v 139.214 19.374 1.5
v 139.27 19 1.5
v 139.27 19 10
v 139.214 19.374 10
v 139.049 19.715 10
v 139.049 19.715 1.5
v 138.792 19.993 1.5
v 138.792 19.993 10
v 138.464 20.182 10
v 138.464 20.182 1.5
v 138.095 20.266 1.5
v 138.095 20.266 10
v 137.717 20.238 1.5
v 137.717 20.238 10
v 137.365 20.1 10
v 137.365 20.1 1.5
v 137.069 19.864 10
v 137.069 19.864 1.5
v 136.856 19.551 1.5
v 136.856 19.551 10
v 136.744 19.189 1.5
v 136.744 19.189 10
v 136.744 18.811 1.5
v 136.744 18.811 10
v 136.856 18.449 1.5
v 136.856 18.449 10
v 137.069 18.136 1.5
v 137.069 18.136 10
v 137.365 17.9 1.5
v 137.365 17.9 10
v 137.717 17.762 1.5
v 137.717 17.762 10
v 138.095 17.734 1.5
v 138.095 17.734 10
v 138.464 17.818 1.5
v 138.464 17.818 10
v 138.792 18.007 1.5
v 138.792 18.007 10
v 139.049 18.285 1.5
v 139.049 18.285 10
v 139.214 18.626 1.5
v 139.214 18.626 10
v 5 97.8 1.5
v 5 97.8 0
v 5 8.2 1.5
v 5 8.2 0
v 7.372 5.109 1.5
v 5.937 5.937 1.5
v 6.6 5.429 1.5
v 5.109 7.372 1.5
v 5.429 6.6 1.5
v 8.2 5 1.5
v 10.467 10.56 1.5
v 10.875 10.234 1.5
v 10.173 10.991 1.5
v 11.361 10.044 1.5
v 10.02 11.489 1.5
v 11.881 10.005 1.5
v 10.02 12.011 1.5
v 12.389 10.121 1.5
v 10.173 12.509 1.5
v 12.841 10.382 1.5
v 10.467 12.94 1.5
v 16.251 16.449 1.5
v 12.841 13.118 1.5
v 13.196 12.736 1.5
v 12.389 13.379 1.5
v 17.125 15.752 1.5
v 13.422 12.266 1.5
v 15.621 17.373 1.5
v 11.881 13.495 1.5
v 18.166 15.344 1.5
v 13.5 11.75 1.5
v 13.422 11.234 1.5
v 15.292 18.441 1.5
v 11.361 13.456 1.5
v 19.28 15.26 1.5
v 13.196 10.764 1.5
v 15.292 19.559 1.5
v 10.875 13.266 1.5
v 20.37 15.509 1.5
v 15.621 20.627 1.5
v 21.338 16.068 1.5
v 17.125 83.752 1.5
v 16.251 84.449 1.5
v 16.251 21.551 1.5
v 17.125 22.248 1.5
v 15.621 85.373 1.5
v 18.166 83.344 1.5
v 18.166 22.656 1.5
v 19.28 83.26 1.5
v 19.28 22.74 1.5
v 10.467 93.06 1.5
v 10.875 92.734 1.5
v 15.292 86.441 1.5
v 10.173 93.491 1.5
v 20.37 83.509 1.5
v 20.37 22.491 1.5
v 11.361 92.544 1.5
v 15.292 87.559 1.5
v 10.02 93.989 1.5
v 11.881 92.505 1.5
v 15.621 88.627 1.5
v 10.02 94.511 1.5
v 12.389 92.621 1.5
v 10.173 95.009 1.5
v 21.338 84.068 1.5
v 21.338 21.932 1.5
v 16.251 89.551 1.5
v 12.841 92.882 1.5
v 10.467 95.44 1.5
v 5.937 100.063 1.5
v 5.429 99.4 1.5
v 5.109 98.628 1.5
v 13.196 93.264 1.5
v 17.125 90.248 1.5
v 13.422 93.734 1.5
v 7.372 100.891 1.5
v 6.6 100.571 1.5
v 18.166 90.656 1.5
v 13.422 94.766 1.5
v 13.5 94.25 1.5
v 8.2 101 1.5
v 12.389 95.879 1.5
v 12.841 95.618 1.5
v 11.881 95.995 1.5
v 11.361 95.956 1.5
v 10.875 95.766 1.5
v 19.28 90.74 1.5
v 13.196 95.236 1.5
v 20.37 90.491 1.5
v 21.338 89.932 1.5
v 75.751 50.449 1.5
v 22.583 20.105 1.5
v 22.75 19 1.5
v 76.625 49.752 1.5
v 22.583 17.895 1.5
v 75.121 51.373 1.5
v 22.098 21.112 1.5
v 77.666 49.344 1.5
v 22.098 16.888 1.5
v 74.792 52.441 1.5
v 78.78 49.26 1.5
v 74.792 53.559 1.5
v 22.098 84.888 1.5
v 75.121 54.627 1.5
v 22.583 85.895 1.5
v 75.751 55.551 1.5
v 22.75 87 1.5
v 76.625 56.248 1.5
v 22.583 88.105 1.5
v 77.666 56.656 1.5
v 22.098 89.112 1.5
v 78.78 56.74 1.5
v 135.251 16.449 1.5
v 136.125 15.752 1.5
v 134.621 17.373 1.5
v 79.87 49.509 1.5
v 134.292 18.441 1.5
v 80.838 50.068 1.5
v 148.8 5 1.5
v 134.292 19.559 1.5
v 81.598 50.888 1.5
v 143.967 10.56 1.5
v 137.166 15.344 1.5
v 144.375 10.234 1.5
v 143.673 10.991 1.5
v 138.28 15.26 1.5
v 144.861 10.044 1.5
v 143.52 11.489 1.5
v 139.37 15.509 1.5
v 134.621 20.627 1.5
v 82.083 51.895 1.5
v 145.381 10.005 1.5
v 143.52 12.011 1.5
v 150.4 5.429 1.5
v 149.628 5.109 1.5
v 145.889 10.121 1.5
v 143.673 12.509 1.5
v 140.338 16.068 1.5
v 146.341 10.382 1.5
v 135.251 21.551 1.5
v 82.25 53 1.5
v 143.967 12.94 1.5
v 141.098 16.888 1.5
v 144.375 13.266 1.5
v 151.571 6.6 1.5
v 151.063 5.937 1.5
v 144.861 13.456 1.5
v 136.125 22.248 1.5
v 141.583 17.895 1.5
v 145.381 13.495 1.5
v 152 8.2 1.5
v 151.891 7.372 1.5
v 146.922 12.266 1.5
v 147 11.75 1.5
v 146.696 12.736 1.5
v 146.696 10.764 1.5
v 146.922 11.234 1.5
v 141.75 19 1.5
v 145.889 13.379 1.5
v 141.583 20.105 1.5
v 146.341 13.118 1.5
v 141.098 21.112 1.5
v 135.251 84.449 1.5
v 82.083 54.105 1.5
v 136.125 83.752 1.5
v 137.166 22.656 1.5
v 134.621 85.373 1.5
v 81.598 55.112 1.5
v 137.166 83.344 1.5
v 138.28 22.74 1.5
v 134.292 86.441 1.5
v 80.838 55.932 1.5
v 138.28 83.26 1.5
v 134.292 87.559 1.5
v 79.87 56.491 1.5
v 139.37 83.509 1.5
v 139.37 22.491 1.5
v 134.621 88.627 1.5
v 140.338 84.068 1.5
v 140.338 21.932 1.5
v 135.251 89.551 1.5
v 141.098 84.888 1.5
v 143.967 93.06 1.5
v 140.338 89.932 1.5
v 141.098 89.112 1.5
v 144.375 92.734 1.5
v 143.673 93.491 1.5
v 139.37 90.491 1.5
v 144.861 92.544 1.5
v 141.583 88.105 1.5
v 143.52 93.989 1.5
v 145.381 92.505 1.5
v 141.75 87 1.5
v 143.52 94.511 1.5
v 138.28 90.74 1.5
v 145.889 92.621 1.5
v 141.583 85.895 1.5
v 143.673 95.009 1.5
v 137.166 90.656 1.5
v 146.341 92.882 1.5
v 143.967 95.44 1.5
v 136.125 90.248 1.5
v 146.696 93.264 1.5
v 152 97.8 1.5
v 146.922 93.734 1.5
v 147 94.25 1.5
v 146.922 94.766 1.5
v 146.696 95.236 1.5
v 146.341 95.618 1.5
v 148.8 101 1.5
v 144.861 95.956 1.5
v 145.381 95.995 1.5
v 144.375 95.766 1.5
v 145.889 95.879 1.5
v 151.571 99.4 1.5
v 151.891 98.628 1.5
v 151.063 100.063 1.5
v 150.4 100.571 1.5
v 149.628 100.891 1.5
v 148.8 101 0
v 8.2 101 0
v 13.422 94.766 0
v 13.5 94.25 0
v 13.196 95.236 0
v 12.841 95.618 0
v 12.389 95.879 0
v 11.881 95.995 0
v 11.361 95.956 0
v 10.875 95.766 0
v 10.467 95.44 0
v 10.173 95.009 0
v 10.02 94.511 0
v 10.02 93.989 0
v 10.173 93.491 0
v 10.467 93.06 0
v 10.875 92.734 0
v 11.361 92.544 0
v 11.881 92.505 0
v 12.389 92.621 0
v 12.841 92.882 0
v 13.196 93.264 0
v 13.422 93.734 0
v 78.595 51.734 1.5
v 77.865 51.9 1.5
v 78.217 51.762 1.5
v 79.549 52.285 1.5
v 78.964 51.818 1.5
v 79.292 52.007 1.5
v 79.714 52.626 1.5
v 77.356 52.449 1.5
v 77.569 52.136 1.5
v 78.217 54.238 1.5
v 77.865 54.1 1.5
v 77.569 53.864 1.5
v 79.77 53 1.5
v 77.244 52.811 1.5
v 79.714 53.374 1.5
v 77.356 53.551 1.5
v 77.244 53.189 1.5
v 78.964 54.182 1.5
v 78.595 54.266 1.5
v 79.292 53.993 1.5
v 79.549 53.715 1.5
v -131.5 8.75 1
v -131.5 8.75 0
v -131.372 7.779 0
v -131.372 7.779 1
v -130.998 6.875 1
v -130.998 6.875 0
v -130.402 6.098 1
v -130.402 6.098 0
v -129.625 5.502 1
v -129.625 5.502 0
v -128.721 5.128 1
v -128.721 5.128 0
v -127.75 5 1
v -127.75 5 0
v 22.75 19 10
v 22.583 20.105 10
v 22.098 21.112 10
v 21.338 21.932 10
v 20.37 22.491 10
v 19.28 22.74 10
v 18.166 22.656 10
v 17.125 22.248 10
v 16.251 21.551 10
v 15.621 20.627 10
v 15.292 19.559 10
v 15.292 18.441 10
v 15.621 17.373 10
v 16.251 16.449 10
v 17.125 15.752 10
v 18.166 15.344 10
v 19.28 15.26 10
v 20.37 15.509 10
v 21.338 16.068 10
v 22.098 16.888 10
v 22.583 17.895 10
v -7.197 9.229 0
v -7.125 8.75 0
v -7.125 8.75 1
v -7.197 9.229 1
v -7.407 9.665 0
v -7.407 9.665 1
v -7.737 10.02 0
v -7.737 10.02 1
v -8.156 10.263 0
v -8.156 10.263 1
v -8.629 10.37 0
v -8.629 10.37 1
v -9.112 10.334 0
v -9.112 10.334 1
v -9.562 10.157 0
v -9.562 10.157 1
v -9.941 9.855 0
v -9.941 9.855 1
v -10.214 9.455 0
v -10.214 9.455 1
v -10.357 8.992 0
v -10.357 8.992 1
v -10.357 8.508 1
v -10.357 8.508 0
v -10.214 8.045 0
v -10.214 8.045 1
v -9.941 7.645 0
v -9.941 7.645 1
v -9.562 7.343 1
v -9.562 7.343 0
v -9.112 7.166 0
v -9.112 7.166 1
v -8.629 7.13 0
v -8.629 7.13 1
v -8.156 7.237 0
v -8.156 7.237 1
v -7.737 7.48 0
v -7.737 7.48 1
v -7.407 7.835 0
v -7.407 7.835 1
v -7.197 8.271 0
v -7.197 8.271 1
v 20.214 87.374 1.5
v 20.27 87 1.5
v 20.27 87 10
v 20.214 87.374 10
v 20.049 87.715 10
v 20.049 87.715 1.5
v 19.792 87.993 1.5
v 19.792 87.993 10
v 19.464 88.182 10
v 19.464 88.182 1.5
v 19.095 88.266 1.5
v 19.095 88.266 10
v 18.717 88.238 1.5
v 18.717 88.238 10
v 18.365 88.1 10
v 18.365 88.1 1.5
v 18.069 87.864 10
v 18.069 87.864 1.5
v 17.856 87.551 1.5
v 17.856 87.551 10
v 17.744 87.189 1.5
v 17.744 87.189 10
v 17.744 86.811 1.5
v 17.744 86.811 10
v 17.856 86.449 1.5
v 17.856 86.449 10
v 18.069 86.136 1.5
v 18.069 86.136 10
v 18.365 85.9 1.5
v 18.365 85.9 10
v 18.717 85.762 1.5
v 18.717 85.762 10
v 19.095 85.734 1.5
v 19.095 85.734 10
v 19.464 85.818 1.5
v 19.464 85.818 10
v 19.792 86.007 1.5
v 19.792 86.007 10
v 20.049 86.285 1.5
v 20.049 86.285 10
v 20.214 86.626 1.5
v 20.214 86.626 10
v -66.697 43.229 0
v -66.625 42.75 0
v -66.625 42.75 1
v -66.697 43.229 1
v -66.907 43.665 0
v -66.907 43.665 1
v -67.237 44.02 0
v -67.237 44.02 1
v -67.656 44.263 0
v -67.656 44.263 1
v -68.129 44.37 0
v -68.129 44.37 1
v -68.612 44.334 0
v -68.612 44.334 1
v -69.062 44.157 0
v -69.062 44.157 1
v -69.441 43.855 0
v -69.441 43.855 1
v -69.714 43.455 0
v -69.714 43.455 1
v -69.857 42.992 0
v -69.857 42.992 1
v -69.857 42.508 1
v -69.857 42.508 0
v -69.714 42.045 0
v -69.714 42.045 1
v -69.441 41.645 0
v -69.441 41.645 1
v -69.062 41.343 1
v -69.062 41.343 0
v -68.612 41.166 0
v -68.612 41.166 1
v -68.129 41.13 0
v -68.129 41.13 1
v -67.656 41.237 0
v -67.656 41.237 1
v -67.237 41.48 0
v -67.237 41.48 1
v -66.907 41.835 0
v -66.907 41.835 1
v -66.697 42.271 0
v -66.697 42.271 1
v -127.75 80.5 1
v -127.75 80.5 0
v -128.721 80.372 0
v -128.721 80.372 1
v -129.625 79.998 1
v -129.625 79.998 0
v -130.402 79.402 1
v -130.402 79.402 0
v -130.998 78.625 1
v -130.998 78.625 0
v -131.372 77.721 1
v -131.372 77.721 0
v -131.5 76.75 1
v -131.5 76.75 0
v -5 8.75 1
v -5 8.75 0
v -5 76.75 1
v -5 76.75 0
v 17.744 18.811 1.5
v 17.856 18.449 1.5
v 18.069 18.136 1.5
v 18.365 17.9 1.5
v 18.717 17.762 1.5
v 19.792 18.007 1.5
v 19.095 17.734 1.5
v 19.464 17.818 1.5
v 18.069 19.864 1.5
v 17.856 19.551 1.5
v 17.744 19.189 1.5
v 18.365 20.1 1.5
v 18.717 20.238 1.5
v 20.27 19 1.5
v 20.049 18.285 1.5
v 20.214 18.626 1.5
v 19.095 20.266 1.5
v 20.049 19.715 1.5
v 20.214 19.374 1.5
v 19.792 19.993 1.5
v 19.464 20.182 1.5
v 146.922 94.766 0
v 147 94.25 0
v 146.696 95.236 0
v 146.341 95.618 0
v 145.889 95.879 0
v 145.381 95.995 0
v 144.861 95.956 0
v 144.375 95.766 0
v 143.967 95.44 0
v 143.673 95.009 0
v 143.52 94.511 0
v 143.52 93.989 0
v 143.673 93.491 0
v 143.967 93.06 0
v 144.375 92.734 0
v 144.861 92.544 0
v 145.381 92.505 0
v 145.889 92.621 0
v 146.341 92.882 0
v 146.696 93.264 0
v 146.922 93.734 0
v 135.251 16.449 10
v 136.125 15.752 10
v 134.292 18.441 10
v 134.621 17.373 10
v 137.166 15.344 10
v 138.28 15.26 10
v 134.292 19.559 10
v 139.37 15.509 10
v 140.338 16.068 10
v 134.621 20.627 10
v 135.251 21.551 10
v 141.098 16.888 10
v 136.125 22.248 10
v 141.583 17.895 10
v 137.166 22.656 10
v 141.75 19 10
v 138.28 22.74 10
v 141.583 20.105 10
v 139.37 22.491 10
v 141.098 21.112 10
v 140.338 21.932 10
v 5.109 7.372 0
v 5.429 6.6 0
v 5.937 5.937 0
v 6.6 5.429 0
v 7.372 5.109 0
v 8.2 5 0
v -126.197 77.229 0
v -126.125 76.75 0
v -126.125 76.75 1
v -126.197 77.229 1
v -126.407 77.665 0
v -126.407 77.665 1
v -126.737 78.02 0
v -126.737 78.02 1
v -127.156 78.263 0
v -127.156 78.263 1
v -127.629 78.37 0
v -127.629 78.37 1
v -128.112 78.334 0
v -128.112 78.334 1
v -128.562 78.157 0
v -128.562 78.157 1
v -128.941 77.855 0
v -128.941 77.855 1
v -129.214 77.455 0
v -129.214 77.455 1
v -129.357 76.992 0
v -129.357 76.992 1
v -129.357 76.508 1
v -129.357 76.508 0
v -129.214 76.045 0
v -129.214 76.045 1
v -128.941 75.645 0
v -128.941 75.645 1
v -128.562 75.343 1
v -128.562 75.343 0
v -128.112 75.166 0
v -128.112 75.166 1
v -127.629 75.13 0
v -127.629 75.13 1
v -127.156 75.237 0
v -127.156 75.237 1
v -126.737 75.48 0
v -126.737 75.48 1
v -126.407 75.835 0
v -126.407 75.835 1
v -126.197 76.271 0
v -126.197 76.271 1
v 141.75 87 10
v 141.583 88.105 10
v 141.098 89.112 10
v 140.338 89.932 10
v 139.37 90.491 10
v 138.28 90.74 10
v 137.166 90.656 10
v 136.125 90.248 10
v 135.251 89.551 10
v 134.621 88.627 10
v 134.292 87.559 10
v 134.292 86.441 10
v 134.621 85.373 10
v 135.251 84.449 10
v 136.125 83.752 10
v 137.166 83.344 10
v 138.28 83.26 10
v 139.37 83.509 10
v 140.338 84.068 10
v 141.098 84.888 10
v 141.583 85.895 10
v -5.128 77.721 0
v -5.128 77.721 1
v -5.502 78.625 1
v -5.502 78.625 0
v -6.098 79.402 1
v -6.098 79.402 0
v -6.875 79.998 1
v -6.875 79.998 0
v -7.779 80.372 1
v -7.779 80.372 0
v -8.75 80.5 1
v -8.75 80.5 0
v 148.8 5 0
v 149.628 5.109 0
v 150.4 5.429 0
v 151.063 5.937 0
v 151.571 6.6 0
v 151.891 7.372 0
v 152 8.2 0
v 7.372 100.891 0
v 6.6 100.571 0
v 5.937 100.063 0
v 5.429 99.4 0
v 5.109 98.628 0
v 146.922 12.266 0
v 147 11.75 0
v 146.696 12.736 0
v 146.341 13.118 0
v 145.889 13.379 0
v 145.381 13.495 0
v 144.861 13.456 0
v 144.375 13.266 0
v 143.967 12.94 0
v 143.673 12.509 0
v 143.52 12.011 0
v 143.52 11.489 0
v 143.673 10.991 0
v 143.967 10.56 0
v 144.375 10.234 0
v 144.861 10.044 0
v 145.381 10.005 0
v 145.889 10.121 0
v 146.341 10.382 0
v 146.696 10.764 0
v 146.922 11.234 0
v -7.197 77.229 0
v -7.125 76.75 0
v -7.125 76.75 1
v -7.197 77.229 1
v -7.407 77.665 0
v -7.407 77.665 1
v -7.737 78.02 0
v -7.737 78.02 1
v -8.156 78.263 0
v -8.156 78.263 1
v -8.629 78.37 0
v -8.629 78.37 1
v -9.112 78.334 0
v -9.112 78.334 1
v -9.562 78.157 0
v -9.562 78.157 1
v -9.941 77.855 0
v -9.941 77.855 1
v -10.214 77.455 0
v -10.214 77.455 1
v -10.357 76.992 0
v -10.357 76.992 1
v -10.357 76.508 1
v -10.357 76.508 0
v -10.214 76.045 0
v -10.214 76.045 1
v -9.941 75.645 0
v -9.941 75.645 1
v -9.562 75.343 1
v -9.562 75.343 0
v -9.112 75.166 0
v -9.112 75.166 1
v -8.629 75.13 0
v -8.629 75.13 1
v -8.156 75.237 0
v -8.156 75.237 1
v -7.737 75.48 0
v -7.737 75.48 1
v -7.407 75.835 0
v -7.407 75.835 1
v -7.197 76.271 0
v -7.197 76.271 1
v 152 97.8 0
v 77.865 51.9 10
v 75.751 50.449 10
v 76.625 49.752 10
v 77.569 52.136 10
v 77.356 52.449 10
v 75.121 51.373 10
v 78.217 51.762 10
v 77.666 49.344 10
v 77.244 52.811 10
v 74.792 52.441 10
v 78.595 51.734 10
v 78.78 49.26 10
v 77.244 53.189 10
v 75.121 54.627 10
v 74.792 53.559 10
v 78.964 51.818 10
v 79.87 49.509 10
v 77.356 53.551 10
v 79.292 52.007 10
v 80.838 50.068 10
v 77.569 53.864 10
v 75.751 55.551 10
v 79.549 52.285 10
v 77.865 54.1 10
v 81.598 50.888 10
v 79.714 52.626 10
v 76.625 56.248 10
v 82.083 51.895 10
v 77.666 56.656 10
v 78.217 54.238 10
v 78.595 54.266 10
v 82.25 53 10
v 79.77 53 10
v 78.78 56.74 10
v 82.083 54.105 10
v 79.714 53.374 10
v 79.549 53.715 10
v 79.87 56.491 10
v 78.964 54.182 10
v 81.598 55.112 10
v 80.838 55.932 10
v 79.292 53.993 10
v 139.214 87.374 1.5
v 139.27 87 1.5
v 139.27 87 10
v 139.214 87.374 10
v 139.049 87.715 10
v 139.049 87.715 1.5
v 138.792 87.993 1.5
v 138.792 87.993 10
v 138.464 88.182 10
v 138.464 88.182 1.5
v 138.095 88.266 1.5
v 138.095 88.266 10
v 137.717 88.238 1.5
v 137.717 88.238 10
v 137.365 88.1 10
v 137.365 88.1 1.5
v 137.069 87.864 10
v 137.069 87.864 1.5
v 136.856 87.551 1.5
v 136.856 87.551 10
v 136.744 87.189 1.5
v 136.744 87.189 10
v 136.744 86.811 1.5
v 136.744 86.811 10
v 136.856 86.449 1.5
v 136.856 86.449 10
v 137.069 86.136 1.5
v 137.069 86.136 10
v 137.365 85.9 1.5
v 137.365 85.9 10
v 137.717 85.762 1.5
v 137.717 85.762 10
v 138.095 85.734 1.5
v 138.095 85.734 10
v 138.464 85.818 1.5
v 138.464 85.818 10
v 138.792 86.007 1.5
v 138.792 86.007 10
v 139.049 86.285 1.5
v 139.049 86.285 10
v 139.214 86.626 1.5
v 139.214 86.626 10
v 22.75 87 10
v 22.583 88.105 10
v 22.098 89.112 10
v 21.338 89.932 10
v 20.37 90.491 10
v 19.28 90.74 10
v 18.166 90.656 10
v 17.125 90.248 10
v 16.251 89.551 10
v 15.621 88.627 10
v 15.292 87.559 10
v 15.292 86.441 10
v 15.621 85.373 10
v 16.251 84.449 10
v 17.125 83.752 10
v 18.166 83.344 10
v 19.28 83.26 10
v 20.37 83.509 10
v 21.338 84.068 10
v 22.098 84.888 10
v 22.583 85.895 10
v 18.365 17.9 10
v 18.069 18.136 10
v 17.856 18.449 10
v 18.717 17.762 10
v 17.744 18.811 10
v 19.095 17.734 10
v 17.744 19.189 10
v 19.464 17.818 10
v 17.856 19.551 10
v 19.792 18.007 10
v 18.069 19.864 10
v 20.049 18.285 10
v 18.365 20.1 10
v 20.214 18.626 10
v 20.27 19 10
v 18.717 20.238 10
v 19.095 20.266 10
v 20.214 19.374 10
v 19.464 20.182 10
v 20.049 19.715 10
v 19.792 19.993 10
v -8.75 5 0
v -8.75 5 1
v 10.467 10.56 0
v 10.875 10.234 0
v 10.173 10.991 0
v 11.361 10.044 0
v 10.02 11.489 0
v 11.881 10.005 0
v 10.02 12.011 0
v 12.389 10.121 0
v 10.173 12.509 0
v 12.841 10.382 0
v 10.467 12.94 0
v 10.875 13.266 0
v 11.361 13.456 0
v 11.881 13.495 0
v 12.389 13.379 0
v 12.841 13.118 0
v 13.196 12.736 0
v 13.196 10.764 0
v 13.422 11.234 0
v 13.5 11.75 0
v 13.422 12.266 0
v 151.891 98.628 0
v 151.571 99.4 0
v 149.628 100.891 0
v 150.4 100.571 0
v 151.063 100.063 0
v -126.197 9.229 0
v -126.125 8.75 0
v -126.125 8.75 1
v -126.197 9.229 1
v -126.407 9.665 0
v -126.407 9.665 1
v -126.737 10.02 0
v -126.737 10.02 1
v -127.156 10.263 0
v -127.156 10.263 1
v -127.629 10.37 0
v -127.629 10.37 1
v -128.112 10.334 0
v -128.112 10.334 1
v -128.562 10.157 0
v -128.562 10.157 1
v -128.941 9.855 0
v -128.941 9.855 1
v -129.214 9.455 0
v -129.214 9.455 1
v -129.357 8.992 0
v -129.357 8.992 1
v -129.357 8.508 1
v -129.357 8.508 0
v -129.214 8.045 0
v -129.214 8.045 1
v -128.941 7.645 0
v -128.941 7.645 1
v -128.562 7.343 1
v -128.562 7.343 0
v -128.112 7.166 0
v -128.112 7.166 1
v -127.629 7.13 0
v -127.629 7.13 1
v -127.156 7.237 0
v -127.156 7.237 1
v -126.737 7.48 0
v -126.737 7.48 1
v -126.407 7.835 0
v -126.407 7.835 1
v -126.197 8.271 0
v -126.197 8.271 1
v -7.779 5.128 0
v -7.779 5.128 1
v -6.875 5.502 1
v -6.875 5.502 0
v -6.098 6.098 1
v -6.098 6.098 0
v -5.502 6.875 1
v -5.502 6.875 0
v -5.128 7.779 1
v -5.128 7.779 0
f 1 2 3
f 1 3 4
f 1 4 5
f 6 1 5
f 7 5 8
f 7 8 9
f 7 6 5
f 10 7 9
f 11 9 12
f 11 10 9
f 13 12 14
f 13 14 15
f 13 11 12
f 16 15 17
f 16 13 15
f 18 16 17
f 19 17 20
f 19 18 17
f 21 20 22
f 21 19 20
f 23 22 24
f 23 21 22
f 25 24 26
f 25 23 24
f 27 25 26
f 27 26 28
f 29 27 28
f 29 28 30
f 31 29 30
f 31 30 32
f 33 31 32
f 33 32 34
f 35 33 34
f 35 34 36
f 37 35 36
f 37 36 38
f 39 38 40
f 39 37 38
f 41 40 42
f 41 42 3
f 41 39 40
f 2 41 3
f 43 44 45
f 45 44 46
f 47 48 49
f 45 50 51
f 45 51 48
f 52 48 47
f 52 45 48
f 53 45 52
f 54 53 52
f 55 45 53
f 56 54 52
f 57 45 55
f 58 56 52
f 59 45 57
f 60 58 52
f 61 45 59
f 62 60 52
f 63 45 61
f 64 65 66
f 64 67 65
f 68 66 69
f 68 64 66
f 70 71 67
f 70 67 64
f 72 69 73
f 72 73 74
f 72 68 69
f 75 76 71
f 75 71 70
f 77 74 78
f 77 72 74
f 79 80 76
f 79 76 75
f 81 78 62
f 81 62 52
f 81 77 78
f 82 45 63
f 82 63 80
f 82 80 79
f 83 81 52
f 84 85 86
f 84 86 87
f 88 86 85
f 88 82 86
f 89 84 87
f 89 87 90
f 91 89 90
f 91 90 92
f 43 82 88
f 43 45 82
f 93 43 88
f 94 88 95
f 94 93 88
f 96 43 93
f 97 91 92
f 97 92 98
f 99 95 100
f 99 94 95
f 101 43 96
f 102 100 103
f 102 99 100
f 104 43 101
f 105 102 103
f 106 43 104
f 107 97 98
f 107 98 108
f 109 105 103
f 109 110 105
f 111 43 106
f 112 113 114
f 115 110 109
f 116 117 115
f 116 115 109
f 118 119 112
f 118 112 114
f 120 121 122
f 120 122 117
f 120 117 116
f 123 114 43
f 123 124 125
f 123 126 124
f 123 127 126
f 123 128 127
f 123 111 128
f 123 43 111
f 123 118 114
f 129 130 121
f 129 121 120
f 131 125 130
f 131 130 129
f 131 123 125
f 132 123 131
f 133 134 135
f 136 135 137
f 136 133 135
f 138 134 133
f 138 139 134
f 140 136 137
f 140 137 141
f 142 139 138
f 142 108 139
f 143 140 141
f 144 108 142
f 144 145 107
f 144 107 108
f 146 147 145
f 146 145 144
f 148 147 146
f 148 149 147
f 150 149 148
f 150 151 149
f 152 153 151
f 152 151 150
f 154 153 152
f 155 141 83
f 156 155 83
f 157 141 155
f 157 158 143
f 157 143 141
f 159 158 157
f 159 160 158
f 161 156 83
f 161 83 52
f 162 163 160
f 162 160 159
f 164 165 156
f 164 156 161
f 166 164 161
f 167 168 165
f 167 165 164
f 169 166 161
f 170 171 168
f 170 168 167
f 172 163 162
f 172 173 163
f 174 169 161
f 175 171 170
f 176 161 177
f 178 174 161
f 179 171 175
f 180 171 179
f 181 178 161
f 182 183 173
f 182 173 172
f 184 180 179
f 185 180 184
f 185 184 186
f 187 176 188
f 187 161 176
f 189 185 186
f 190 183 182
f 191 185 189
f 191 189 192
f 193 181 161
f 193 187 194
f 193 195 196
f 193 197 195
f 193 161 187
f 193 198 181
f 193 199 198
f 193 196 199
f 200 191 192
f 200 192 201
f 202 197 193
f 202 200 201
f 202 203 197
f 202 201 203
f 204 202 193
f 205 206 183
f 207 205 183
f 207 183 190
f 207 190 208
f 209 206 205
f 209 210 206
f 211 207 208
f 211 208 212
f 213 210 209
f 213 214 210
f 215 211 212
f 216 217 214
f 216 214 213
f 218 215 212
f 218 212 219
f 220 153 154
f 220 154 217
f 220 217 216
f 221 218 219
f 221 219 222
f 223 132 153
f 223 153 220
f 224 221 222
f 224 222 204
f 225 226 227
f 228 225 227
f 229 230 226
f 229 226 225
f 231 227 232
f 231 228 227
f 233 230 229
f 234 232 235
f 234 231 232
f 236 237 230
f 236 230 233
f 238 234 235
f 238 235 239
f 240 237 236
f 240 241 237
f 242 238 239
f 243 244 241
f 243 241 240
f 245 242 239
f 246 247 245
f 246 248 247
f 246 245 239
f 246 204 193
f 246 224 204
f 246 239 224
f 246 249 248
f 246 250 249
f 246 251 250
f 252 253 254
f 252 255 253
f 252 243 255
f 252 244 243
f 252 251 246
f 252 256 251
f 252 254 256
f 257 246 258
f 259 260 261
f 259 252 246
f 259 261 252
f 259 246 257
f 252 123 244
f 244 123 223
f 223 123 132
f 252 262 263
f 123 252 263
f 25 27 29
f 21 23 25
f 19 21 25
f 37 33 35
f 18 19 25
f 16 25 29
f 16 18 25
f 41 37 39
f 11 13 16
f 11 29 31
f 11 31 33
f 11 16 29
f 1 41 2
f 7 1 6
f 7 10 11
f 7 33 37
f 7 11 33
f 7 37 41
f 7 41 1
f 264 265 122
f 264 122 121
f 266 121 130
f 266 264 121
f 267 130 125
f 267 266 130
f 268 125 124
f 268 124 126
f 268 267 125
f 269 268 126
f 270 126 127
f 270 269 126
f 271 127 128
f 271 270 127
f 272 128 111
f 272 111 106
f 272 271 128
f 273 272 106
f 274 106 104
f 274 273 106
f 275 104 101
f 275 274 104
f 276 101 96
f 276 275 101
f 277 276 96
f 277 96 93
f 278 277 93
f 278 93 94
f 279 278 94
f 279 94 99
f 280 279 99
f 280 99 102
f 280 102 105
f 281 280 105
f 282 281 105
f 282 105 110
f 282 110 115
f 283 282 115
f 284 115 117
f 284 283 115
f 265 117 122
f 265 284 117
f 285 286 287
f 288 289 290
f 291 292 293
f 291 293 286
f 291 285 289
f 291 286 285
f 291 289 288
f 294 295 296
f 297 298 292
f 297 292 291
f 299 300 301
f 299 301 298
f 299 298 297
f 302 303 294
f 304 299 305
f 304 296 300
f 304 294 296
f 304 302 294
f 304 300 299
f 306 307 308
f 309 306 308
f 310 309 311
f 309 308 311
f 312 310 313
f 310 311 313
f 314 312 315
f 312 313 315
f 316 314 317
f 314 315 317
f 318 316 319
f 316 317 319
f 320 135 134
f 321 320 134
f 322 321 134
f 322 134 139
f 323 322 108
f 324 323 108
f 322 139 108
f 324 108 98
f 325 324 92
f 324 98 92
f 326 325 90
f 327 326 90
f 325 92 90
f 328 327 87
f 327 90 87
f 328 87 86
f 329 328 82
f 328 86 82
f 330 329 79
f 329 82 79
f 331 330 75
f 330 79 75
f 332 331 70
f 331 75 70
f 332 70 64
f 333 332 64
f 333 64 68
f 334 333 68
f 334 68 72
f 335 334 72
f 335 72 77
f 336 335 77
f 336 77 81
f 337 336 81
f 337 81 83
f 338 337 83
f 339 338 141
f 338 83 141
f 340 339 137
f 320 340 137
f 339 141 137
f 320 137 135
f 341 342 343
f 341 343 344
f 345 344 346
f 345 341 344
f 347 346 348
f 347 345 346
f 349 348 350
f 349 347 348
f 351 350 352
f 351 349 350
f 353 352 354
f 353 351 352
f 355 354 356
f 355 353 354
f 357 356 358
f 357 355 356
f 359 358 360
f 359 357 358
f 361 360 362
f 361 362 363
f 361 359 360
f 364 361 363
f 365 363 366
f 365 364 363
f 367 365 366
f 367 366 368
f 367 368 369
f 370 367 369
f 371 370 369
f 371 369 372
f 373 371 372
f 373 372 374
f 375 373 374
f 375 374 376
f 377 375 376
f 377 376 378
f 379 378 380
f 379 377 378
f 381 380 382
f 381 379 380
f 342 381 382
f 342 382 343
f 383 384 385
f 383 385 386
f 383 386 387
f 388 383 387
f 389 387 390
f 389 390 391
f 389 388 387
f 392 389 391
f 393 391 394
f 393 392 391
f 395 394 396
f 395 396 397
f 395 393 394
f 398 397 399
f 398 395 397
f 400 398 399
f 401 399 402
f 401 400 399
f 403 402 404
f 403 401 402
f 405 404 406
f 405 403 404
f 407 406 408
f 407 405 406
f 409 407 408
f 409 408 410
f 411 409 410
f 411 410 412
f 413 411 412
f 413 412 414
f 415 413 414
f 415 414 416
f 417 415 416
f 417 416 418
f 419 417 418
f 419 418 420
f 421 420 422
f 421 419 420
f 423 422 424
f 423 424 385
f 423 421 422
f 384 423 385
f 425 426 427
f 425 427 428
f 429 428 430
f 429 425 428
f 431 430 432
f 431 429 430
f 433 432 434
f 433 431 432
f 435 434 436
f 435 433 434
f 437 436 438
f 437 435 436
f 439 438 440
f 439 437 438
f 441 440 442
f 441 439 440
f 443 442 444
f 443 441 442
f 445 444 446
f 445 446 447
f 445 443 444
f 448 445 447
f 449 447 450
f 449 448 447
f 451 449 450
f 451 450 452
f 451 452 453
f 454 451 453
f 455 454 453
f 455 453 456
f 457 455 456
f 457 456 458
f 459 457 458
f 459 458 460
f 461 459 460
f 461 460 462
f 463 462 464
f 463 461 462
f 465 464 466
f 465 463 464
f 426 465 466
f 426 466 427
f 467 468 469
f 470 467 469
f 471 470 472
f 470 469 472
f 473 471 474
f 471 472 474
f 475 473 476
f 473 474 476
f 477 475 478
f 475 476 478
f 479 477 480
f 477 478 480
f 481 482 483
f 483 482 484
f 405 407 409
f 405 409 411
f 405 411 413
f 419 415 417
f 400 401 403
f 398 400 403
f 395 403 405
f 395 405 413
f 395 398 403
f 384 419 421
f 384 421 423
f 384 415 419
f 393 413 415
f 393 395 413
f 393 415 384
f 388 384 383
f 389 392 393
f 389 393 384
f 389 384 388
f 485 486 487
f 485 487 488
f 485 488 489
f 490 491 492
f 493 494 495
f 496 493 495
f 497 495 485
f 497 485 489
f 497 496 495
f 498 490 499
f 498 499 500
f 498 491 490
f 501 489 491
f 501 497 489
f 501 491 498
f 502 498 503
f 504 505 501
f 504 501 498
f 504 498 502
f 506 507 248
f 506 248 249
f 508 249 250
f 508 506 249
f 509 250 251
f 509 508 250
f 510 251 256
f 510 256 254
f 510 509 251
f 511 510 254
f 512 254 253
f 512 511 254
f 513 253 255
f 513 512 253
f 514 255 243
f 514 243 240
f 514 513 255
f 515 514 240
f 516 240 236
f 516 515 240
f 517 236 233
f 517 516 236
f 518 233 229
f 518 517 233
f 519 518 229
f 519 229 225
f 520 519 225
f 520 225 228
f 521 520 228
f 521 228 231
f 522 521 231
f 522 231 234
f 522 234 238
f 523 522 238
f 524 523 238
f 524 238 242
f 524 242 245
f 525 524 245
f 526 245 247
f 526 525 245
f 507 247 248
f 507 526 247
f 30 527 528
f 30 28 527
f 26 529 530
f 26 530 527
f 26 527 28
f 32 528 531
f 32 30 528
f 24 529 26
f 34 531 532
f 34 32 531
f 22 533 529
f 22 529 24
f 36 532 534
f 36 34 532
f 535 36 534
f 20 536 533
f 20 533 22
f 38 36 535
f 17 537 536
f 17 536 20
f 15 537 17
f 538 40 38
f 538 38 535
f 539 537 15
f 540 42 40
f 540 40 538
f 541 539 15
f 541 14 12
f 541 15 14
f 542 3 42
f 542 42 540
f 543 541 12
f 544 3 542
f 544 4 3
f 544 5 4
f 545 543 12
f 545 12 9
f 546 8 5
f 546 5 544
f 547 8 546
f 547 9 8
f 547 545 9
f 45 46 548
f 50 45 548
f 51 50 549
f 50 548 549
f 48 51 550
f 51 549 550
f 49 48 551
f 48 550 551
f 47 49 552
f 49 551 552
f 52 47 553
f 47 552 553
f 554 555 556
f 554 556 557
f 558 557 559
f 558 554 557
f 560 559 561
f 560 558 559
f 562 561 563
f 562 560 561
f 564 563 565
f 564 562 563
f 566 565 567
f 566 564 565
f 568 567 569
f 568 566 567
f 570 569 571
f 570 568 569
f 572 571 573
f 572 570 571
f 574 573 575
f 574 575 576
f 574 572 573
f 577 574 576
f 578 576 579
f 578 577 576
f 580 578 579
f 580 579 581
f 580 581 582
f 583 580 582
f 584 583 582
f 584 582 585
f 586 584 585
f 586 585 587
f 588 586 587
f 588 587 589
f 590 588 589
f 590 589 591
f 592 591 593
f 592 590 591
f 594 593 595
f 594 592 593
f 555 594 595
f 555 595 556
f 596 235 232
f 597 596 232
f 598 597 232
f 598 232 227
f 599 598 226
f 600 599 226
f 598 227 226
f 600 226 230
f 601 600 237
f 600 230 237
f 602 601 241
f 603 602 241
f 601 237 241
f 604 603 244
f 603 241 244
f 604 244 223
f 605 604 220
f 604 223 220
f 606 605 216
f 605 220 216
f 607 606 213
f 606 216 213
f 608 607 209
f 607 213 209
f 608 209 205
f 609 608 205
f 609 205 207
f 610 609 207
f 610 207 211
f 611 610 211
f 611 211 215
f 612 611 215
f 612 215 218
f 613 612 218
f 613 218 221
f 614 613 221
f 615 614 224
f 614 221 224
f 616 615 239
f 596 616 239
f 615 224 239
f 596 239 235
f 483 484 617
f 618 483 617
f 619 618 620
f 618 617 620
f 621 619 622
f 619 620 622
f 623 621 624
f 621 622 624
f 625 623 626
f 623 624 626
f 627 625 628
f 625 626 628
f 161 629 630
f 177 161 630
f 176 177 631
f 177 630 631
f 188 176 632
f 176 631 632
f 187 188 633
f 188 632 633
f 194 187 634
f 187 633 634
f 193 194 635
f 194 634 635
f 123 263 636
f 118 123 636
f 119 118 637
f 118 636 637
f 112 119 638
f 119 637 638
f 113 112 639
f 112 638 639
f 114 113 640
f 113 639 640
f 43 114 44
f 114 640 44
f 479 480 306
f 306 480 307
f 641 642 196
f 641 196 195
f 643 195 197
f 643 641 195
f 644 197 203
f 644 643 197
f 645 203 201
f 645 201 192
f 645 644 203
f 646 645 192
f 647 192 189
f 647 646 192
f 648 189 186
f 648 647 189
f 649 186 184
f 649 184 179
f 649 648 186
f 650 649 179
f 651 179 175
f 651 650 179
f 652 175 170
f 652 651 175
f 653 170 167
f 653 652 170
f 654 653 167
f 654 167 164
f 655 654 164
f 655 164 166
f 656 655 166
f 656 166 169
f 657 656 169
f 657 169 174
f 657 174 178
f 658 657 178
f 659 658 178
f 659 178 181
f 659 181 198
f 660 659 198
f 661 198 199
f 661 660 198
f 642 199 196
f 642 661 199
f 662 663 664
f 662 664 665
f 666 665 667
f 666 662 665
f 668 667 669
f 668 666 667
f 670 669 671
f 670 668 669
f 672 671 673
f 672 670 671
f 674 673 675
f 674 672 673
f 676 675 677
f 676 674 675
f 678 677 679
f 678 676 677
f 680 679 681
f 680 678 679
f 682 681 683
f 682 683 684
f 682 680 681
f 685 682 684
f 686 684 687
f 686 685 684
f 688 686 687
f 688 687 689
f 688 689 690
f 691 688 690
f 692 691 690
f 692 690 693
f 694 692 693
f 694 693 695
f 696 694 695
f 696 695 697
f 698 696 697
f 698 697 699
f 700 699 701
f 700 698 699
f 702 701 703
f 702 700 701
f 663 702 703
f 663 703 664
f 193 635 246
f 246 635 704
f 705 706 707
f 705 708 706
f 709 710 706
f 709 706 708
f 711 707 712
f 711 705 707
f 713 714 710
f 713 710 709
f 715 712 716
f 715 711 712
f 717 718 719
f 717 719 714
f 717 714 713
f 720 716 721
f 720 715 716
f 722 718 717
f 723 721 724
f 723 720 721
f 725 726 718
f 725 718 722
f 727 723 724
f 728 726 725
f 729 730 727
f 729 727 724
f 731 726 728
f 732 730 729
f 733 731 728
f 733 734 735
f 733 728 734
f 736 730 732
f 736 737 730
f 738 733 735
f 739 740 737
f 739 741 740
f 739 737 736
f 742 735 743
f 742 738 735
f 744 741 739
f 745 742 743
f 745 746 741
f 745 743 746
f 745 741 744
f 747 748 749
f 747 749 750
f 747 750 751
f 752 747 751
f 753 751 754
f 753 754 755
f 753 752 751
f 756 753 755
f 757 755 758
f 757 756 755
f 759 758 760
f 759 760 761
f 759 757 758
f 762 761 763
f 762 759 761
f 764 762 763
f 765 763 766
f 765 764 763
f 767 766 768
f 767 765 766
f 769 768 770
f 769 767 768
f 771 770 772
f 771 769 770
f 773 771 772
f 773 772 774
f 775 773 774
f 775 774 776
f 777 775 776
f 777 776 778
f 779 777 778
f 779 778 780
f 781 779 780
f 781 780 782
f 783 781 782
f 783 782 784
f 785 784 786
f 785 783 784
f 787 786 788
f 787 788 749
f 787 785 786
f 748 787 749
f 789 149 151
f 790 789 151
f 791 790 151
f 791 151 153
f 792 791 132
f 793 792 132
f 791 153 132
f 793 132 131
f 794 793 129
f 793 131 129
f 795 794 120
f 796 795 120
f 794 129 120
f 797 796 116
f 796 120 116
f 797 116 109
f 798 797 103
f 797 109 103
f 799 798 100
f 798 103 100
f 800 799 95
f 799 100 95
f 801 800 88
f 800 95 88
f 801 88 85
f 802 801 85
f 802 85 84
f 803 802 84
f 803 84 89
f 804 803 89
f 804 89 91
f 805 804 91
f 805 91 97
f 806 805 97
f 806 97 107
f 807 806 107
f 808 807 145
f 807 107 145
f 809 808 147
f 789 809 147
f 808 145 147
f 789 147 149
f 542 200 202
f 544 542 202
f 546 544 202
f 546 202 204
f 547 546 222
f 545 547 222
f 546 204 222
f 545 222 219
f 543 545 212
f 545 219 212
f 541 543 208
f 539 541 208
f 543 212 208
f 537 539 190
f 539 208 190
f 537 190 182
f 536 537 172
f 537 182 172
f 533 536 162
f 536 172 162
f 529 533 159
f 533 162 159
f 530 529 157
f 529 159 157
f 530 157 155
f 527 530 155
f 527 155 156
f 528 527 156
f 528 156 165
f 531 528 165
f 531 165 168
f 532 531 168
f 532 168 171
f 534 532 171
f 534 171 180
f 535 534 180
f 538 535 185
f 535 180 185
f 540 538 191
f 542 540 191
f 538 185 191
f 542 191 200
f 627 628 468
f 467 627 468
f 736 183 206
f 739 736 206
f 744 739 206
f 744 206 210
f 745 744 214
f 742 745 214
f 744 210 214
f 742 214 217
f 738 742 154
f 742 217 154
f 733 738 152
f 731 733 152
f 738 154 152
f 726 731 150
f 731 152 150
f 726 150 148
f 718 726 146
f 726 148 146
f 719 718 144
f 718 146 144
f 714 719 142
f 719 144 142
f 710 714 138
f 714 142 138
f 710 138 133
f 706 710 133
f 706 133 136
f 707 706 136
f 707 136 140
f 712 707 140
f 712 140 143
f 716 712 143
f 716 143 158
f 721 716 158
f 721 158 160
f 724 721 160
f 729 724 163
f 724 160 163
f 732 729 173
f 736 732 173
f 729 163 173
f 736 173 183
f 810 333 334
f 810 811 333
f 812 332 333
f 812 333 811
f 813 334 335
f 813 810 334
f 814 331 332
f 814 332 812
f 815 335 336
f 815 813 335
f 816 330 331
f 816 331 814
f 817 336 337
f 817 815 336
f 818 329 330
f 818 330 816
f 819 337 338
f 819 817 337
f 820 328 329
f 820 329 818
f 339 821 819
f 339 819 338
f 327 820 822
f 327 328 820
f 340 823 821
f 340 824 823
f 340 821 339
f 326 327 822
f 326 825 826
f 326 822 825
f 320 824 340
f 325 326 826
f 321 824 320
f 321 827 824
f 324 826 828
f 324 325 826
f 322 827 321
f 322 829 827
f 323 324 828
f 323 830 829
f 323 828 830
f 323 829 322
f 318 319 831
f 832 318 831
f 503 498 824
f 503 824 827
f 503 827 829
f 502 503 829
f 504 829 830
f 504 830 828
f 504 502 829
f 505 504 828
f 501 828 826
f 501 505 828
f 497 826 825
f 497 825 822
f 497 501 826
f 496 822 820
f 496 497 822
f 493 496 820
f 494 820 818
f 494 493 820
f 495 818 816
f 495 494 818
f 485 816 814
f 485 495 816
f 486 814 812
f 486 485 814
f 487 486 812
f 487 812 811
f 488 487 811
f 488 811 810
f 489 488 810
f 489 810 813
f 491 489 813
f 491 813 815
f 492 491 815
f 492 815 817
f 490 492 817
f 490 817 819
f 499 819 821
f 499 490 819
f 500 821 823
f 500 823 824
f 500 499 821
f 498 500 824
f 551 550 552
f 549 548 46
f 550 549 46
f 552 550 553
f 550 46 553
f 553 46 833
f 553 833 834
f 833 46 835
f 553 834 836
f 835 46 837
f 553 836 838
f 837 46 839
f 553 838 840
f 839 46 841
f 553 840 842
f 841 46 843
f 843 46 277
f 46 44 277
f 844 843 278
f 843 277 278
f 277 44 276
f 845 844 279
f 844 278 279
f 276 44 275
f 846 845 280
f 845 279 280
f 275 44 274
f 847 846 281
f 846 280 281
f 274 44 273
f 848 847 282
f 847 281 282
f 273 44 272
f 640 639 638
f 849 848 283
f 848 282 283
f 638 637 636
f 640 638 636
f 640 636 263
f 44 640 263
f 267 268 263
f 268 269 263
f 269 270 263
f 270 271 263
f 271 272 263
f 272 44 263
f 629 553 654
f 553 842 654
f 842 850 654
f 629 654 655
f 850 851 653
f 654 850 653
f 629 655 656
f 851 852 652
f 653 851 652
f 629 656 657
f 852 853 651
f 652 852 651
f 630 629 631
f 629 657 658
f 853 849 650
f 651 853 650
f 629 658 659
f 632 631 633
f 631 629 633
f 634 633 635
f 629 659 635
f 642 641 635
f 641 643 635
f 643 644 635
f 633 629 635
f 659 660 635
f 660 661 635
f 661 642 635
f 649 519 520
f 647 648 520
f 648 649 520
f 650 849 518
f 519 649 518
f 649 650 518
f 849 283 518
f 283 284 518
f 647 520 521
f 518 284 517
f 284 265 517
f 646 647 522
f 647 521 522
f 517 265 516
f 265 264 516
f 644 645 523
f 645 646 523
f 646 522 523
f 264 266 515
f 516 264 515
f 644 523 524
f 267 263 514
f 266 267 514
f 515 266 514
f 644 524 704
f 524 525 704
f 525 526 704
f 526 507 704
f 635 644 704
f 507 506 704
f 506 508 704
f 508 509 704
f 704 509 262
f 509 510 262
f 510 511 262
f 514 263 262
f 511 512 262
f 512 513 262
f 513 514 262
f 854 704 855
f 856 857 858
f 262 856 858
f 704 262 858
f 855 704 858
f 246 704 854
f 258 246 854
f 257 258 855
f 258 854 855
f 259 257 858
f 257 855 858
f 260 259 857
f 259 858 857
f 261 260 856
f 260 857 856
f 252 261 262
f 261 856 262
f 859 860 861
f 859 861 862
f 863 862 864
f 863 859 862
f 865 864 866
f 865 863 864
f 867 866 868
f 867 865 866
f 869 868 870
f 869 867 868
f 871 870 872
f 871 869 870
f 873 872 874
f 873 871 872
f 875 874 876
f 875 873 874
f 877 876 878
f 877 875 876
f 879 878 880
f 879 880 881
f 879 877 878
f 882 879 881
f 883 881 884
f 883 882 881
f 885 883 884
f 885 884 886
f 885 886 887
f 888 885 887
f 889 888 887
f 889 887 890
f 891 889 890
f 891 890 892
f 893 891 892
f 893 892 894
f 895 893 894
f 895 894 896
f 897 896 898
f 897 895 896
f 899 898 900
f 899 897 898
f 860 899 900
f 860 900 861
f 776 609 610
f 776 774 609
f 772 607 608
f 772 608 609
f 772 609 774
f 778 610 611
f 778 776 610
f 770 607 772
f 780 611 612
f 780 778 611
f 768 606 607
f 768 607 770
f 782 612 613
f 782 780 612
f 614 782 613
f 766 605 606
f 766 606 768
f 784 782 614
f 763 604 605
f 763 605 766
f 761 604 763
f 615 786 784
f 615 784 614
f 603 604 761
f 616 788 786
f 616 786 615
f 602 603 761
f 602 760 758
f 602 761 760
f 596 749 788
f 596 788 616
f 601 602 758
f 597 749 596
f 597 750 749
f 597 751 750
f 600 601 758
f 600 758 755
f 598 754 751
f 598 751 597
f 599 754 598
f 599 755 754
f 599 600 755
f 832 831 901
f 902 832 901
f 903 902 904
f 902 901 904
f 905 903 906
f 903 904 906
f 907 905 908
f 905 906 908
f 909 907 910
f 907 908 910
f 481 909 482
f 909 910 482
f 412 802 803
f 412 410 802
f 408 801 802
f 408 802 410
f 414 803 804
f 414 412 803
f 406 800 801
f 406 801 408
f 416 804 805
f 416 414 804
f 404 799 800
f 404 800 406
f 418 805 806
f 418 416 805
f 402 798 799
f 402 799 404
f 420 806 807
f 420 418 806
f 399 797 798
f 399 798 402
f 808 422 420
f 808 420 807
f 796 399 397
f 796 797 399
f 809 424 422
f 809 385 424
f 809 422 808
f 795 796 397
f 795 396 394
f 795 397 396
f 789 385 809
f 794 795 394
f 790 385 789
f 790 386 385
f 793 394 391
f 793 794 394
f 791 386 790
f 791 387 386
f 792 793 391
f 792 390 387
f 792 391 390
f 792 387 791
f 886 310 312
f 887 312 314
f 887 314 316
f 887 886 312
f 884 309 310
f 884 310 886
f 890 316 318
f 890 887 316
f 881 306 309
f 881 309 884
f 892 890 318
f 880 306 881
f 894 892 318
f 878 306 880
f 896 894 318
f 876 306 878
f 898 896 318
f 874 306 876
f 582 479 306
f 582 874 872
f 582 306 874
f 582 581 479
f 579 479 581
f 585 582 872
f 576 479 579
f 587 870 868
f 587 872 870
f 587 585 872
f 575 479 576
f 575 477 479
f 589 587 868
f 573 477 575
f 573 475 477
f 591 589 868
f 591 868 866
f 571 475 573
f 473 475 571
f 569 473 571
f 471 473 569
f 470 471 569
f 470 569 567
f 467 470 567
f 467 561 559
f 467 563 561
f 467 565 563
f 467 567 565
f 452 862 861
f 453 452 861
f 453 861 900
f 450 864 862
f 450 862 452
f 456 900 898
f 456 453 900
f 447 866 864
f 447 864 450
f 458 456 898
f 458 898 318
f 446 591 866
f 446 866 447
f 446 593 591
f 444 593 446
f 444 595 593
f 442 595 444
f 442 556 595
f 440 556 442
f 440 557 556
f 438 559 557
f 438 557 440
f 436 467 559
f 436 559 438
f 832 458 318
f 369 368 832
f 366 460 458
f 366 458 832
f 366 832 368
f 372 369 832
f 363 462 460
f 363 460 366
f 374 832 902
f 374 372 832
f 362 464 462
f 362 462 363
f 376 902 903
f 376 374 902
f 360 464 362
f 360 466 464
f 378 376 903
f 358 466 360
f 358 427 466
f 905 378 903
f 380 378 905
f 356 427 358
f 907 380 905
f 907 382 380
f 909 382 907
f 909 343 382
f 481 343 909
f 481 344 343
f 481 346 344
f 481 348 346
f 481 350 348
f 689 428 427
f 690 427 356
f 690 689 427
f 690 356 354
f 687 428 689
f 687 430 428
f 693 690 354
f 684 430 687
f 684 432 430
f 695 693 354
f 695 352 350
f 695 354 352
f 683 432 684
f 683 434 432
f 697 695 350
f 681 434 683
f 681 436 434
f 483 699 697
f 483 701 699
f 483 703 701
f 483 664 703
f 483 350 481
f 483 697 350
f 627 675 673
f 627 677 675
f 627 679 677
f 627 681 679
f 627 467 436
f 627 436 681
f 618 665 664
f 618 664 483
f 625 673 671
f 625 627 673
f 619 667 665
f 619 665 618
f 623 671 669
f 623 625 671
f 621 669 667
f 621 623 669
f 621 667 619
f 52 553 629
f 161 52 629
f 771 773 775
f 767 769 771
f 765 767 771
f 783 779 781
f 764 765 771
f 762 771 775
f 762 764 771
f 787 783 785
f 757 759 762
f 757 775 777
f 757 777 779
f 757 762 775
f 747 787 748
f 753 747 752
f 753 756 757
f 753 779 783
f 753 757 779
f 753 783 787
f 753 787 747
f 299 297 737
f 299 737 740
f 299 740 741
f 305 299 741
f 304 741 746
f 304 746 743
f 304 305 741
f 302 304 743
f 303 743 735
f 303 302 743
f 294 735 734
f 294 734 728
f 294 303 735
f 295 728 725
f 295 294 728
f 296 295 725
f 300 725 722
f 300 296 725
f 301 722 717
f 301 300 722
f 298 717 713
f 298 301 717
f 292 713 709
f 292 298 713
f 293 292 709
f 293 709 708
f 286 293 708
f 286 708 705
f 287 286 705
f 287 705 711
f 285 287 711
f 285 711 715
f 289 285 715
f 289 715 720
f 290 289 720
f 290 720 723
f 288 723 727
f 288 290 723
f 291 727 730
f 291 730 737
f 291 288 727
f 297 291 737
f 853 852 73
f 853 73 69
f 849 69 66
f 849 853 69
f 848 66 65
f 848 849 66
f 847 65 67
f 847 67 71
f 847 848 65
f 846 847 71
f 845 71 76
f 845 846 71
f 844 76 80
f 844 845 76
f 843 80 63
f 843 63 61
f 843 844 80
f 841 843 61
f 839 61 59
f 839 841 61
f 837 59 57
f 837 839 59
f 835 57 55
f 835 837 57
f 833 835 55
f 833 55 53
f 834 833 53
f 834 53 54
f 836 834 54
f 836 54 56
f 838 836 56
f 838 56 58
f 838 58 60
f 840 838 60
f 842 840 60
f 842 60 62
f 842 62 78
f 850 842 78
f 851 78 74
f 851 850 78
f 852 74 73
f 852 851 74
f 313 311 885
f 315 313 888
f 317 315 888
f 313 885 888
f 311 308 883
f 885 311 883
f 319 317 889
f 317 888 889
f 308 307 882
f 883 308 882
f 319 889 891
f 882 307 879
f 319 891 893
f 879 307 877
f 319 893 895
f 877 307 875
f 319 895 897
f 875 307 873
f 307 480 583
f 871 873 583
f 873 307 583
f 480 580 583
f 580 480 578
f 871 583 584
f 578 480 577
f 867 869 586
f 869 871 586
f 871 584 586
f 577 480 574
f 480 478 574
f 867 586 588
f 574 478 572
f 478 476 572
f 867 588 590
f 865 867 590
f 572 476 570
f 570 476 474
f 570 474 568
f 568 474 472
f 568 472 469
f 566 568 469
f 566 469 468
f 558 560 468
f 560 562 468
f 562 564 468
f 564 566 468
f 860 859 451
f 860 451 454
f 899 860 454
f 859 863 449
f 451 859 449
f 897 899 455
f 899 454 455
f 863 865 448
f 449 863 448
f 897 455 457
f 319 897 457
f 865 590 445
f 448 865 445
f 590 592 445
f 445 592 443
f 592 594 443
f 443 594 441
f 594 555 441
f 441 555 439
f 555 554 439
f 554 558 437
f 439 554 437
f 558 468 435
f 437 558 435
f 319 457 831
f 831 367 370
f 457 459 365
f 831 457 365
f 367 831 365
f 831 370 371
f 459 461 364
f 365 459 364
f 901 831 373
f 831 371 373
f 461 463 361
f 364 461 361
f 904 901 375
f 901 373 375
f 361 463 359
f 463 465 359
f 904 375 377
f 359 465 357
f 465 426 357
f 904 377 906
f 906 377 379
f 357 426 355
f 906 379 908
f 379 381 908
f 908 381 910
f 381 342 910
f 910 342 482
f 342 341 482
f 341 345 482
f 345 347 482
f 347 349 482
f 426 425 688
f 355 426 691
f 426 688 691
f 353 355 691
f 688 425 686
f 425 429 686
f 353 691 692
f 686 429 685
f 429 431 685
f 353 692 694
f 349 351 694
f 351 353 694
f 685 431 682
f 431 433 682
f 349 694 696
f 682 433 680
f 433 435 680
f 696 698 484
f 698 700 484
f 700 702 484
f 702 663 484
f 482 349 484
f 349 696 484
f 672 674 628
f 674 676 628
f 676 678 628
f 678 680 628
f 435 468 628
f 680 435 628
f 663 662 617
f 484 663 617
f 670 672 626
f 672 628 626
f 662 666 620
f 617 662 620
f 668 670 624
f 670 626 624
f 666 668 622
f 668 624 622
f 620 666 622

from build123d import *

# Parameters (mm, degrees)
F0_R     = 1.75
F1_DEPTH = 1.5
F2_R     = 3.75
F2_R_2   = 1.27
F3_DEPTH = 8.5
F4_R     = 1.625
F5_DEPTH = 1


with BuildPart() as f1:
    # F0 (on Top) → F1 (new body)
    with BuildSketch(Plane.XY):
        with BuildLine():
            ThreePointArc((5, 8.2), (5.937258, 5.937258), (8.2, 5))
            Line((8.2, 5), (148.8, 5))
            ThreePointArc((148.8, 5), (151.062742, 5.937258), (152, 8.2))
            Line((152, 8.2), (152, 97.8))
            ThreePointArc((152, 97.8), (151.062742, 100.062742), (148.8, 101))
            Line((148.8, 101), (8.2, 101))
            ThreePointArc((8.2, 101), (5.937258, 100.062742), (5, 97.8))
            Line((5, 97.8), (5, 8.2))
        make_face()
        with Locations((11.75, 11.75)):
            Circle(F0_R, mode=Mode.SUBTRACT)
        with Locations((145.25, 11.75)):
            Circle(F0_R, mode=Mode.SUBTRACT)
        with Locations((11.75, 94.25)):
            Circle(F0_R, mode=Mode.SUBTRACT)
        with Locations((145.25, 94.25)):
            Circle(F0_R, mode=Mode.SUBTRACT)
    extrude(amount=F1_DEPTH)

    # F2 (on face) → F3 (join)
    with BuildSketch(Plane.XY.offset(1.5)):
        with Locations((19, 19)):
            Circle(F2_R)
        with Locations((19, 19)):
            Circle(F2_R_2, mode=Mode.SUBTRACT)
        with Locations((138, 19)):
            Circle(F2_R)
        with Locations((138, 19)):
            Circle(F2_R_2, mode=Mode.SUBTRACT)
        with Locations((138, 87)):
            Circle(F2_R)
        with Locations((138, 87)):
            Circle(F2_R_2, mode=Mode.SUBTRACT)
        with Locations((19, 87)):
            Circle(F2_R)
        with Locations((19, 87)):
            Circle(F2_R_2, mode=Mode.SUBTRACT)
        with Locations((78.5, 53)):
            Circle(F2_R)
        with Locations((78.5, 53)):
            Circle(F2_R_2, mode=Mode.SUBTRACT)
    extrude(amount=F3_DEPTH)


with BuildPart() as f5:
    # F4 (on Top) → F5 (new body)
    with BuildSketch(Plane.XY):
        with BuildLine():
            Line((-127.75, 5), (-8.75, 5))
            ThreePointArc((-8.75, 5), (-6.09835, 6.09835), (-5, 8.75))
            Line((-5, 8.75), (-5, 76.75))
            ThreePointArc((-5, 76.75), (-6.09835, 79.40165), (-8.75, 80.5))
            Line((-8.75, 80.5), (-127.75, 80.5))
            ThreePointArc((-127.75, 80.5), (-130.40165, 79.40165), (-131.5, 76.75))
            Line((-131.5, 76.75), (-131.5, 8.75))
            ThreePointArc((-131.5, 8.75), (-130.40165, 6.09835), (-127.75, 5))
        make_face()
        with Locations((-127.75, 8.75)):
            Circle(F4_R, mode=Mode.SUBTRACT)
        with Locations((-8.75, 8.75)):
            Circle(F4_R, mode=Mode.SUBTRACT)
        with Locations((-68.25, 42.75)):
            Circle(F4_R, mode=Mode.SUBTRACT)
        with Locations((-127.75, 76.75)):
            Circle(F4_R, mode=Mode.SUBTRACT)
        with Locations((-8.75, 76.75)):
            Circle(F4_R, mode=Mode.SUBTRACT)
    extrude(amount=F5_DEPTH)


solid = Compound([f1.part, f5.part])
